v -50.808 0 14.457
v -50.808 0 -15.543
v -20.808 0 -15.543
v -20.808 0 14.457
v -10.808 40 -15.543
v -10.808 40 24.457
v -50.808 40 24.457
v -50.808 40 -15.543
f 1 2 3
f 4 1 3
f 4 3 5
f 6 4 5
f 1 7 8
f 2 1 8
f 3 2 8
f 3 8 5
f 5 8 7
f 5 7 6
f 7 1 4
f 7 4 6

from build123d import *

# Parameters (mm, degrees)
SKETCH_1_W          = 40
SKETCH_1_H          = 40
EXTRUDE_1_DEPTH     = 40
CUT_EXTRUDE_1_DEPTH = 77.035731628
CUT_EXTRUDE_2_DEPTH = 62.629021291


with BuildPart() as part:
    # Эскиз1 → Бобышка-Вытянуть1 (new body)
    with BuildSketch(Plane(origin=(0, 0, 0), x_dir=(1, 0, 0), z_dir=(0, 1, 0))):
        with Locations((-30.807799443, -4.456824513)):
            Rectangle(SKETCH_1_W, SKETCH_1_H)
    extrude(amount=EXTRUDE_1_DEPTH)

    # Эскиз2 → Вырез-Вытянуть1 (cut, through all)
    with BuildSketch(Plane(origin=(0, 0, -15.543175487), x_dir=(-1, 0, 0), z_dir=(0, 0, -1))):
        Polygon((10.807799443, 40), (10.807799443, 0), (20.807799443, 0), align=None)
    extrude(amount=-CUT_EXTRUDE_1_DEPTH, mode=Mode.SUBTRACT)

    # Эскиз3 → Вырез-Вытянуть2 (cut, through all)
    with BuildSketch(Plane.ZY.offset(50.807799443)):
        Polygon((24.456824513, 0), (14.456824513, 0), (24.456824513, 40), align=None)
    extrude(amount=-CUT_EXTRUDE_2_DEPTH, mode=Mode.SUBTRACT)


solid = part.part
